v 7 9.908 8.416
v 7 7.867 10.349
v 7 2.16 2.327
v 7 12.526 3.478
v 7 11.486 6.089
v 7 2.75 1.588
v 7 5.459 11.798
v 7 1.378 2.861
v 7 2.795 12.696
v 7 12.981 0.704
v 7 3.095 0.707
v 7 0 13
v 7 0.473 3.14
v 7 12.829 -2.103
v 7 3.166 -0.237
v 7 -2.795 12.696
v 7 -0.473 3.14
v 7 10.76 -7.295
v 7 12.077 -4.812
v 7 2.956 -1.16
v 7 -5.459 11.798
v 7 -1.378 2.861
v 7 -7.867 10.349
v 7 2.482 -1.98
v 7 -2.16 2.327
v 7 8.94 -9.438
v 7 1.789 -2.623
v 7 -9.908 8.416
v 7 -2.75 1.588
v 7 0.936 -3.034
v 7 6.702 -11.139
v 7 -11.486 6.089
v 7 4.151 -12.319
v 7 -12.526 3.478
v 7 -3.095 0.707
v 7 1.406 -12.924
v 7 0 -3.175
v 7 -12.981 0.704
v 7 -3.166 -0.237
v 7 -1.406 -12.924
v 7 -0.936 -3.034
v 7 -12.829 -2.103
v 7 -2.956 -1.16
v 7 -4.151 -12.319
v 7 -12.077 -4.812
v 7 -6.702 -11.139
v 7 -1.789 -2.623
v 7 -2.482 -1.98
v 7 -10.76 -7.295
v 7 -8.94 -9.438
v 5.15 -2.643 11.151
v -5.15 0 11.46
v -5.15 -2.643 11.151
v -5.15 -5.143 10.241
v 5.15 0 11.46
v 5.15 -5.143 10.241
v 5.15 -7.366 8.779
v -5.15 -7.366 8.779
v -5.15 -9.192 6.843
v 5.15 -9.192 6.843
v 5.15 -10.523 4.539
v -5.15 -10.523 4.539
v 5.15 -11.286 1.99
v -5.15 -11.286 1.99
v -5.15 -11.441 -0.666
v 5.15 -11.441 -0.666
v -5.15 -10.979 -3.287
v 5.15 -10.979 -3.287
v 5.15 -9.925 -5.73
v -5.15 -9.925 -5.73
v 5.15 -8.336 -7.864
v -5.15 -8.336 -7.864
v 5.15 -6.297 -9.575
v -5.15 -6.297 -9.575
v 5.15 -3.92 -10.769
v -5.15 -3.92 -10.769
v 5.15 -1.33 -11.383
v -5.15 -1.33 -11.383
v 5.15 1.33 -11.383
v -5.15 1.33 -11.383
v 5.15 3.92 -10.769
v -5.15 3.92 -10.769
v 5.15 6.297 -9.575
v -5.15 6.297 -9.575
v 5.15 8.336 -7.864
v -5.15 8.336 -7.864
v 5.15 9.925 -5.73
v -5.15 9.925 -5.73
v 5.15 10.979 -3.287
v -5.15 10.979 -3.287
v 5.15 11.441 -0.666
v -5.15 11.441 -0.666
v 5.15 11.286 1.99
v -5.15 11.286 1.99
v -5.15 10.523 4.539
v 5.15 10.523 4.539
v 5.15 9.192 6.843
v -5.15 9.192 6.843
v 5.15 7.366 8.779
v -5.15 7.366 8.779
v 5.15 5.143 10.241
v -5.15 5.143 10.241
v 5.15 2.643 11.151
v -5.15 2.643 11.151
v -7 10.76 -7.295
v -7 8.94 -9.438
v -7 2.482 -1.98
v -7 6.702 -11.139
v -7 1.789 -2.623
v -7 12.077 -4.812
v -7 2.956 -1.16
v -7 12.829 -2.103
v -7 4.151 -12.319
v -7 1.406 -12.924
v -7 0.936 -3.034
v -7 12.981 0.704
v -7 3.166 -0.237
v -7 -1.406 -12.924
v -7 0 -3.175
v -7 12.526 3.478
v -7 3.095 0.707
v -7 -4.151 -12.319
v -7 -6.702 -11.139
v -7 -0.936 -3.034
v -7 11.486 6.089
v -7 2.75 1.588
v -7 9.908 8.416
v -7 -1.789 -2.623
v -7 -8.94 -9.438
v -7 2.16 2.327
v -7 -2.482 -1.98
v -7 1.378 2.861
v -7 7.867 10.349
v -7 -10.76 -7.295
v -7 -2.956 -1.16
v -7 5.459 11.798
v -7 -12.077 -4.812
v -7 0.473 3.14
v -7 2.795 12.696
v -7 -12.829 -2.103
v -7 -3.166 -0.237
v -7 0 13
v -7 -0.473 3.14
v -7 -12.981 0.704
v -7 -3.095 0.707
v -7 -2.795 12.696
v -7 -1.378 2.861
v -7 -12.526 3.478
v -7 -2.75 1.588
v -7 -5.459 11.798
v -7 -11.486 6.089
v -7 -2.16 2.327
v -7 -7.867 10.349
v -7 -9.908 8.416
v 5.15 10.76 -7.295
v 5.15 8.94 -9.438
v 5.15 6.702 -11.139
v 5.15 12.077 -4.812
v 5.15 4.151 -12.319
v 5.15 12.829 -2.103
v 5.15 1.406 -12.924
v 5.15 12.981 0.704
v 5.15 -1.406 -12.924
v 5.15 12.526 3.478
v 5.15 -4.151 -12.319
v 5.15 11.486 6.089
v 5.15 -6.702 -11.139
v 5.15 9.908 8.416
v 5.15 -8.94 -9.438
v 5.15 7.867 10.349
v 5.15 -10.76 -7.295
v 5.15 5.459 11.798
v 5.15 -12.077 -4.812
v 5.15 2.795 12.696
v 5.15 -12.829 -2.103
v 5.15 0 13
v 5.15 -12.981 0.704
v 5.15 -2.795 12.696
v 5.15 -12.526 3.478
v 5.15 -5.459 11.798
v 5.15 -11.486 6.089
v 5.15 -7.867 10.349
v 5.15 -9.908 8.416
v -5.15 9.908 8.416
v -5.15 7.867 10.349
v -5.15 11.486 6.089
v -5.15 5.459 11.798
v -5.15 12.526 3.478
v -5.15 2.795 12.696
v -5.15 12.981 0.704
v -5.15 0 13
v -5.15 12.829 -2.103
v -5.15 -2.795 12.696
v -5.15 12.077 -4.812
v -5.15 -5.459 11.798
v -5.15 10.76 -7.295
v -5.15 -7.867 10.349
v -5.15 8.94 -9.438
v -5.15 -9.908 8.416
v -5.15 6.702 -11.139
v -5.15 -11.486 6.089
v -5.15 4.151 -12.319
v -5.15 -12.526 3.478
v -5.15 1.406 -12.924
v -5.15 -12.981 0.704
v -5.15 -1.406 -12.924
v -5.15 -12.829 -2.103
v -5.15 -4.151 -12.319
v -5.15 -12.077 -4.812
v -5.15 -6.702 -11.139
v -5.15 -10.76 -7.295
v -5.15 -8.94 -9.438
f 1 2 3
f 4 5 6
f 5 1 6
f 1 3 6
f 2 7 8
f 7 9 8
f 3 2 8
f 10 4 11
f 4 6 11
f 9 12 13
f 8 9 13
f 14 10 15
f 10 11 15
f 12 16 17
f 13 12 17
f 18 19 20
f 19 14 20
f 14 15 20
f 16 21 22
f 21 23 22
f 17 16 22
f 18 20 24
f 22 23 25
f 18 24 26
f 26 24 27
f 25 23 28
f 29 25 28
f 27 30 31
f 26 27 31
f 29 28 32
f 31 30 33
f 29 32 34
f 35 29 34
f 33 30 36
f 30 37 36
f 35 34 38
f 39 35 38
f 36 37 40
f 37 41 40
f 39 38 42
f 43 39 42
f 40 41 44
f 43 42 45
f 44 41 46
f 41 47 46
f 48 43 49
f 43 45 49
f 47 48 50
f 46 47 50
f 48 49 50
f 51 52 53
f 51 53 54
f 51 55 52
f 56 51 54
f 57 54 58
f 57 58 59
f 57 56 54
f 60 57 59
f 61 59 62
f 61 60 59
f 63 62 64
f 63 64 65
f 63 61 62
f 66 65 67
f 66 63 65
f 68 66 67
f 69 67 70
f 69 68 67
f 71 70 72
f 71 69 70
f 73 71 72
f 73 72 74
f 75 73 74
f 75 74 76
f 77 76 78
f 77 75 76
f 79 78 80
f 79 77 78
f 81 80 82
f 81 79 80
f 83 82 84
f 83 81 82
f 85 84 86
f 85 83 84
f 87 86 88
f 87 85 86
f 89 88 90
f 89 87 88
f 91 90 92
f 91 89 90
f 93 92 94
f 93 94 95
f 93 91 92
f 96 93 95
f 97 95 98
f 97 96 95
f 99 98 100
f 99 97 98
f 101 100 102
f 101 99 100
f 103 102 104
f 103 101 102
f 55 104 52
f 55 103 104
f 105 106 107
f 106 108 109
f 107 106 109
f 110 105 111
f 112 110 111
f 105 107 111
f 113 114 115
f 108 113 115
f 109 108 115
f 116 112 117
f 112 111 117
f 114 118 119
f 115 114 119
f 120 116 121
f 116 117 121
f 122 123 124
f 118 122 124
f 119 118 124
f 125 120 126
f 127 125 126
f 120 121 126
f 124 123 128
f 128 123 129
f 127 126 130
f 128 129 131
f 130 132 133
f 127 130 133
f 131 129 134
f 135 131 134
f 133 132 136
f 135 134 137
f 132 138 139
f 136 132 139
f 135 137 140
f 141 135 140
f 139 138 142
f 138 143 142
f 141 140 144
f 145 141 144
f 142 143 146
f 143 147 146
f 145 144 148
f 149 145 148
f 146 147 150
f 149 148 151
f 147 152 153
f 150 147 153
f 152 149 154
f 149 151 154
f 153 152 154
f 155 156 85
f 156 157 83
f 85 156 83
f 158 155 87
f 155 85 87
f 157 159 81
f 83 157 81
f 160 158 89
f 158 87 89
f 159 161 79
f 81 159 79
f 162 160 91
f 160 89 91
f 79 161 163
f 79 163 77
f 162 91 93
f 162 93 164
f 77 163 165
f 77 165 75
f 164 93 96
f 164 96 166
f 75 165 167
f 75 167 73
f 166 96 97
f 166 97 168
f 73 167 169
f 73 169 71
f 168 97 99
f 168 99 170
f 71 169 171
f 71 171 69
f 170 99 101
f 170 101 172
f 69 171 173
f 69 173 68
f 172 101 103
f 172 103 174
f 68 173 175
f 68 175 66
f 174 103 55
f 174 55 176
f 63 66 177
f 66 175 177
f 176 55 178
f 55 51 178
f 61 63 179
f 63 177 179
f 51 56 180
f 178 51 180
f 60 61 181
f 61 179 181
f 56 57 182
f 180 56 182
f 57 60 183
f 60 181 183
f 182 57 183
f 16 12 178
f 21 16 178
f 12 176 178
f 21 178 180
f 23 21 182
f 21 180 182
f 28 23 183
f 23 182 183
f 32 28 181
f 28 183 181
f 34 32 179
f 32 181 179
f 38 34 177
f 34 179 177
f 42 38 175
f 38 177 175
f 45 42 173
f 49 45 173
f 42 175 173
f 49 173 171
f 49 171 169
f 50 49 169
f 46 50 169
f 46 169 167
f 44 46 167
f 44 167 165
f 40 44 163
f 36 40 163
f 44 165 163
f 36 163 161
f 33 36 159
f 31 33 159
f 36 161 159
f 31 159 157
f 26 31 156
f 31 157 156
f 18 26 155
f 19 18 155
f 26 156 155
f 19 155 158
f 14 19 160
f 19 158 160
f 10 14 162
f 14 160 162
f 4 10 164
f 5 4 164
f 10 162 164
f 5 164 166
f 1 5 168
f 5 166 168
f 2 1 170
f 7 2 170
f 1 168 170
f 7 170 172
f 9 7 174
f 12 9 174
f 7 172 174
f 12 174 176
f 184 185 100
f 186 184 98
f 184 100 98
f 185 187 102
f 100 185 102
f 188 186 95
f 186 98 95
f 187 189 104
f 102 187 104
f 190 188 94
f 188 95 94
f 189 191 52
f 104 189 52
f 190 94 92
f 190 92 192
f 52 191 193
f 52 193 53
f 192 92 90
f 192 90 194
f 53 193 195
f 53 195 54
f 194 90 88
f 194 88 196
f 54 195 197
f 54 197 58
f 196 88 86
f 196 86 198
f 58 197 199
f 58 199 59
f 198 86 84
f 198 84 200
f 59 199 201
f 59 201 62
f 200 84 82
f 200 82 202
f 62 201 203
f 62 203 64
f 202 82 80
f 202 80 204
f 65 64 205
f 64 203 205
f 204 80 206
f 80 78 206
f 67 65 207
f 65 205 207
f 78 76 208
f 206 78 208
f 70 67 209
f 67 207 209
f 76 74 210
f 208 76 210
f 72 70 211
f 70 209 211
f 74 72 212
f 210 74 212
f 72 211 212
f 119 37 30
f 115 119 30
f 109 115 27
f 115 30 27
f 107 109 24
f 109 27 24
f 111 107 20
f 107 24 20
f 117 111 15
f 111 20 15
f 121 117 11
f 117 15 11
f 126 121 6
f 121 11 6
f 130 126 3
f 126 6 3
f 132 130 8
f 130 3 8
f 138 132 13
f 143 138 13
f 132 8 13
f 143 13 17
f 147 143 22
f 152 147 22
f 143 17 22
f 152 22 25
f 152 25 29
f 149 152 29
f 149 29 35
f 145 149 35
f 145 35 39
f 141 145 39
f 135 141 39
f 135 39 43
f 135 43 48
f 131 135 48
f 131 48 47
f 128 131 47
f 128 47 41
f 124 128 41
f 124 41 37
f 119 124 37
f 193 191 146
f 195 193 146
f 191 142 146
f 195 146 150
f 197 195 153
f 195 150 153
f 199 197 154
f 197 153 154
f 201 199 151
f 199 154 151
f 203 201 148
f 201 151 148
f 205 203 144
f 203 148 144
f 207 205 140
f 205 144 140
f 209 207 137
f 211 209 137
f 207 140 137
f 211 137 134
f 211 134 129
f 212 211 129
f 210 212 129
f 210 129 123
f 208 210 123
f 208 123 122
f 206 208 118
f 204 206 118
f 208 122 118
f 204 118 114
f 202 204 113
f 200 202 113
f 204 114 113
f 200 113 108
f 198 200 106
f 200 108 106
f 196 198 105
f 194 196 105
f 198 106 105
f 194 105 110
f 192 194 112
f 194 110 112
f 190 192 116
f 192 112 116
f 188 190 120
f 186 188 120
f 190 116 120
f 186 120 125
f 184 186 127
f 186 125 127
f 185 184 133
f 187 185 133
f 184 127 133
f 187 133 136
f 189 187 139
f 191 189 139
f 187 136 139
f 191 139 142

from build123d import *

# Parameters (mm, degrees)
F_1_4_0_25_DIAMETER_HOLE1_D = 6.35


with BuildPart() as part:
    # Sketch1 → Revolve1 (revolve)
    with BuildSketch(Plane(origin=(0, 0, 0), x_dir=(1, 0, 0), z_dir=(0, 1, 0))):
        Polygon((0, -11.46), (-5.15, -11.46), (-5.15, -13), (-7, -13), (-7, 0), (7, 0), (7, -13), (5.15, -13), (5.15, -11.46), align=None)
    revolve(axis=Axis((-7, 0, 0), (1, 0, 0)))

    # 1/4 (0.25) Diameter Hole1 (through all)
    with Locations(Plane.ZY.offset(7)):
        with Locations((0, 0)):
            Hole(F_1_4_0_25_DIAMETER_HOLE1_D / 2)


solid = part.part
